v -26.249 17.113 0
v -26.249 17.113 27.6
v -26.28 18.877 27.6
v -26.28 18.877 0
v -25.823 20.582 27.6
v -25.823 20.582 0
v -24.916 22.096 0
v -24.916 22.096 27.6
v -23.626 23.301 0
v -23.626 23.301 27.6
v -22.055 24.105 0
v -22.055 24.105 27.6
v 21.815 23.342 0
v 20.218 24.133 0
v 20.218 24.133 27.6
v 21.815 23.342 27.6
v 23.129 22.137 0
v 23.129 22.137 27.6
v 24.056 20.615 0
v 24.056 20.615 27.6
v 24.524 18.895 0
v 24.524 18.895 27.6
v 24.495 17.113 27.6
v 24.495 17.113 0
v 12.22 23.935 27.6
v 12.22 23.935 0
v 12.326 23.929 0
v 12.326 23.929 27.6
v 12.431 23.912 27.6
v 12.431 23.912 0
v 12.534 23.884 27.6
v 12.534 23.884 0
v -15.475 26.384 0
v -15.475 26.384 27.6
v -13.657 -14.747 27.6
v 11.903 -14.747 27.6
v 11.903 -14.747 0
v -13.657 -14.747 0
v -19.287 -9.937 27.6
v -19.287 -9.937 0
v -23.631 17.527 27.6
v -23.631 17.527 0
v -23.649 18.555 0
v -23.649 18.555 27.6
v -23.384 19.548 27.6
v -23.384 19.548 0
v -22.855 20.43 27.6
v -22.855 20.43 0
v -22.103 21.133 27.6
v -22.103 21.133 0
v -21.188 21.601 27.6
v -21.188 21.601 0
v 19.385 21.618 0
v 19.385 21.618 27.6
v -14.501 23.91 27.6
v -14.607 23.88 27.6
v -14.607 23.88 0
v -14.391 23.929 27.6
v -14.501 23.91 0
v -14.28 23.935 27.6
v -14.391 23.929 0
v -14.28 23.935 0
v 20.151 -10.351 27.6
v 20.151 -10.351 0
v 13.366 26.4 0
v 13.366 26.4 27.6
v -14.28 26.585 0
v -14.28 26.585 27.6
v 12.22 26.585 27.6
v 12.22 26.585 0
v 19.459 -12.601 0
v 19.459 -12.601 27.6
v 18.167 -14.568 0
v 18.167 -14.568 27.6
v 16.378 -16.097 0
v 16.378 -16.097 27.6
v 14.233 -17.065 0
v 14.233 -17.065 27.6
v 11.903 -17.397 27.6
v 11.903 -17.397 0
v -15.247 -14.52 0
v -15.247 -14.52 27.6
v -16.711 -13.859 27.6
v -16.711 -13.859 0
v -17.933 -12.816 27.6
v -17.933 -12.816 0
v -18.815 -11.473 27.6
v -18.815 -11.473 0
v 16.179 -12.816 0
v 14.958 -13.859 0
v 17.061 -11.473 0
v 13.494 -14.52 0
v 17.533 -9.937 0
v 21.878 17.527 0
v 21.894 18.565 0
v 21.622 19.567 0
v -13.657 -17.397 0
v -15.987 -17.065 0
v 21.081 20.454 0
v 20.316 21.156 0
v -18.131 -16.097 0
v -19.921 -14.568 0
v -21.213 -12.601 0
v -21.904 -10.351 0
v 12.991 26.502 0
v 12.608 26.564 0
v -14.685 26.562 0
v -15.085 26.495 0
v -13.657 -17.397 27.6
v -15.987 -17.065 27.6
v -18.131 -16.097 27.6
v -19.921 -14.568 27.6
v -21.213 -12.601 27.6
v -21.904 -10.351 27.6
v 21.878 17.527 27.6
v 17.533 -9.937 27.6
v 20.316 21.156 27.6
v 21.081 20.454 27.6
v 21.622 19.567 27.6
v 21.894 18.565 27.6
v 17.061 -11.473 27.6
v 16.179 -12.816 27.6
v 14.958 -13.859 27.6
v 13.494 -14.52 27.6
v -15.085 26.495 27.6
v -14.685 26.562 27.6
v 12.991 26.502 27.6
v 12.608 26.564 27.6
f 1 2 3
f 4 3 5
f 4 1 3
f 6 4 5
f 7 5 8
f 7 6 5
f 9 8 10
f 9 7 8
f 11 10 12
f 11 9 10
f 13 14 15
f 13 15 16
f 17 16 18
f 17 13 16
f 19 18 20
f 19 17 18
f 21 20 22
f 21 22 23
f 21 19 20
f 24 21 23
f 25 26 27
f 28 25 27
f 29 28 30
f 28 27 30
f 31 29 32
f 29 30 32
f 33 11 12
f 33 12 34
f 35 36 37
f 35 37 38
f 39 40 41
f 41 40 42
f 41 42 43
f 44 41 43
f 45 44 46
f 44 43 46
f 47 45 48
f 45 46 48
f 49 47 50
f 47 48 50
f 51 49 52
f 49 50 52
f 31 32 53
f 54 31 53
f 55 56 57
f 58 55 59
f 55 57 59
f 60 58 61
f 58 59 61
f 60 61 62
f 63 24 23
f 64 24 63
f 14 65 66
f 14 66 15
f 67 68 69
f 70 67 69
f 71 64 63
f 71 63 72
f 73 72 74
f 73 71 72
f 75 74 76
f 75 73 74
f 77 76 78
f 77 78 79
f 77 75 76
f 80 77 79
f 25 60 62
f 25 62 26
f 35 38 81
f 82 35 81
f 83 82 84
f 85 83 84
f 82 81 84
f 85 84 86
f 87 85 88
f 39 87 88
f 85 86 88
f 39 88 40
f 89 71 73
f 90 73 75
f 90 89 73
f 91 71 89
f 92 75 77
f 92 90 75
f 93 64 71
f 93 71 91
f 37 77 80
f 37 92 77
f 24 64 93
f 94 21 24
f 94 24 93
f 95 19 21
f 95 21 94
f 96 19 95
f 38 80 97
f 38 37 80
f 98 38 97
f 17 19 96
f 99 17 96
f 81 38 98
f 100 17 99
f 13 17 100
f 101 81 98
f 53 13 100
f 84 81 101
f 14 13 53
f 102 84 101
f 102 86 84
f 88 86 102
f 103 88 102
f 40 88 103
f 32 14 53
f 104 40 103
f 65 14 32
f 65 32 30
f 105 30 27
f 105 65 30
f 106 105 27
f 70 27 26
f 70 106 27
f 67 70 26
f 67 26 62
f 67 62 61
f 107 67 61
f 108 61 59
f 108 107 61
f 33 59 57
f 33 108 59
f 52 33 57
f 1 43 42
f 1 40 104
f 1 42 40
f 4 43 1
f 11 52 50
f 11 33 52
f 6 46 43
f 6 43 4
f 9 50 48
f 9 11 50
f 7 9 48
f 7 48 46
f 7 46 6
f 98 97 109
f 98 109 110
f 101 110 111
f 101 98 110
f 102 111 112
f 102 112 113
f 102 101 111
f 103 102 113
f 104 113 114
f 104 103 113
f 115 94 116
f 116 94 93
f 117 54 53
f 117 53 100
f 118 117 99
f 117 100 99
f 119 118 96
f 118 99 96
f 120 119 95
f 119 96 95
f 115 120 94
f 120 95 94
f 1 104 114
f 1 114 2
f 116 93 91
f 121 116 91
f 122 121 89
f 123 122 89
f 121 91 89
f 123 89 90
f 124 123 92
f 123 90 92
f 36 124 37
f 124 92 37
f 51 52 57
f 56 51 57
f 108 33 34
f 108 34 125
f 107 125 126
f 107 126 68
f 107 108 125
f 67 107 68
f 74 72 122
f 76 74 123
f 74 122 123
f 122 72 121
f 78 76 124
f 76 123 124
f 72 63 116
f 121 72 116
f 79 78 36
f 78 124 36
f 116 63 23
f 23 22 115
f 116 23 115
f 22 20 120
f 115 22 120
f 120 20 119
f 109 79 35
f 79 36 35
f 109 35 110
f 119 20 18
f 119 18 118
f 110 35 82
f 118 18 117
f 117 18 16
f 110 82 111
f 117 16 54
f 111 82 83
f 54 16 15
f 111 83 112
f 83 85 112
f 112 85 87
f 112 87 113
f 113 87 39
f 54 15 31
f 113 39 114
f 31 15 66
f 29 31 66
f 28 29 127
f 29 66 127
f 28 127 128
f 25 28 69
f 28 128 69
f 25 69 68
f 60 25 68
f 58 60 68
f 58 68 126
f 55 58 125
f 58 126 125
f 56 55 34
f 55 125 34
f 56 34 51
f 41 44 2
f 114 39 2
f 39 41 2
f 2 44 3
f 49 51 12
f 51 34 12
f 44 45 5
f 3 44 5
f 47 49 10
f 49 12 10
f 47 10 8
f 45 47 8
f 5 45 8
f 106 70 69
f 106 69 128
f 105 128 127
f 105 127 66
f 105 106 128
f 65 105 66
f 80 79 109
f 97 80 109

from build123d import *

# Parameters (mm, degrees)
EXTRUDE_1_DEPTH = 27.6


with BuildPart() as part:
    # 草图1 → 凸台-拉伸1 (new body)
    with BuildSketch(Plane.XY):
        with BuildLine():
            Line((13.366208682, 26.400087715), (20.217636418, 24.133453872))
            ThreePointArc((20.217636418, 24.133453872), (23.645978989, 21.408723367), (24.49520491, 17.112619964))
            Line((24.49520491, 17.112619964), (20.150640538, -10.351388685))
            ThreePointArc((20.150640538, -10.351388685), (17.326686466, -15.395594315), (11.903196789, -17.396715696))
            Line((11.903196789, -17.396715696), (-13.656803211, -17.396715696))
            ThreePointArc((-13.656803211, -17.396715696), (-19.080292887, -15.395594315), (-21.90424696, -10.351388685))
            Line((-21.90424696, -10.351388685), (-26.248811331, 17.112619964))
            ThreePointArc((-26.248811331, 17.112619964), (-25.422376853, 21.371021729), (-22.054699947, 24.105200178))
            Line((-22.054699947, 24.105200178), (-15.474583087, 26.383847403))
            ThreePointArc((-15.474583087, 26.383847403), (-14.885785491, 26.534208607), (-14.280201498, 26.584796429))
            Line((-14.280201498, 26.584796429), (12.219798502, 26.584796429))
            ThreePointArc((12.219798502, 26.584796429), (12.800395955, 26.538323396), (13.366208682, 26.400087715))
        make_face()
        with BuildLine():
            Line((12.533883483, 23.884191302), (19.385311219, 21.617557459))
            ThreePointArc((19.385311219, 21.617557459), (21.38292815, 20.029919212), (21.877752702, 17.526677859))
            Line((21.877752702, 17.526677859), (17.53318833, -9.93733079))
            ThreePointArc((17.53318833, -9.93733079), (15.605459203, -13.380680741), (11.903196789, -14.746715696))
            Line((11.903196789, -14.746715696), (-13.656803211, -14.746715696))
            ThreePointArc((-13.656803211, -14.746715696), (-17.359065624, -13.380680741), (-19.286794752, -9.93733079))
            Line((-19.286794752, -9.93733079), (-23.631359123, 17.526677859))
            ThreePointArc((-23.631359123, 17.526677859), (-23.149814624, 20.007951328), (-21.187546191, 21.601094677))
            Line((-21.187546191, 21.601094677), (-14.60742933, 23.879741901))
            ThreePointArc((-14.60742933, 23.879741901), (-14.446114921, 23.920936752), (-14.280201498, 23.934796429))
            Line((-14.280201498, 23.934796429), (12.219798502, 23.934796429))
            ThreePointArc((12.219798502, 23.934796429), (12.378866298, 23.922064091), (12.533883483, 23.884191302))
        make_face(mode=Mode.SUBTRACT)
    extrude(amount=EXTRUDE_1_DEPTH)


solid = part.part
